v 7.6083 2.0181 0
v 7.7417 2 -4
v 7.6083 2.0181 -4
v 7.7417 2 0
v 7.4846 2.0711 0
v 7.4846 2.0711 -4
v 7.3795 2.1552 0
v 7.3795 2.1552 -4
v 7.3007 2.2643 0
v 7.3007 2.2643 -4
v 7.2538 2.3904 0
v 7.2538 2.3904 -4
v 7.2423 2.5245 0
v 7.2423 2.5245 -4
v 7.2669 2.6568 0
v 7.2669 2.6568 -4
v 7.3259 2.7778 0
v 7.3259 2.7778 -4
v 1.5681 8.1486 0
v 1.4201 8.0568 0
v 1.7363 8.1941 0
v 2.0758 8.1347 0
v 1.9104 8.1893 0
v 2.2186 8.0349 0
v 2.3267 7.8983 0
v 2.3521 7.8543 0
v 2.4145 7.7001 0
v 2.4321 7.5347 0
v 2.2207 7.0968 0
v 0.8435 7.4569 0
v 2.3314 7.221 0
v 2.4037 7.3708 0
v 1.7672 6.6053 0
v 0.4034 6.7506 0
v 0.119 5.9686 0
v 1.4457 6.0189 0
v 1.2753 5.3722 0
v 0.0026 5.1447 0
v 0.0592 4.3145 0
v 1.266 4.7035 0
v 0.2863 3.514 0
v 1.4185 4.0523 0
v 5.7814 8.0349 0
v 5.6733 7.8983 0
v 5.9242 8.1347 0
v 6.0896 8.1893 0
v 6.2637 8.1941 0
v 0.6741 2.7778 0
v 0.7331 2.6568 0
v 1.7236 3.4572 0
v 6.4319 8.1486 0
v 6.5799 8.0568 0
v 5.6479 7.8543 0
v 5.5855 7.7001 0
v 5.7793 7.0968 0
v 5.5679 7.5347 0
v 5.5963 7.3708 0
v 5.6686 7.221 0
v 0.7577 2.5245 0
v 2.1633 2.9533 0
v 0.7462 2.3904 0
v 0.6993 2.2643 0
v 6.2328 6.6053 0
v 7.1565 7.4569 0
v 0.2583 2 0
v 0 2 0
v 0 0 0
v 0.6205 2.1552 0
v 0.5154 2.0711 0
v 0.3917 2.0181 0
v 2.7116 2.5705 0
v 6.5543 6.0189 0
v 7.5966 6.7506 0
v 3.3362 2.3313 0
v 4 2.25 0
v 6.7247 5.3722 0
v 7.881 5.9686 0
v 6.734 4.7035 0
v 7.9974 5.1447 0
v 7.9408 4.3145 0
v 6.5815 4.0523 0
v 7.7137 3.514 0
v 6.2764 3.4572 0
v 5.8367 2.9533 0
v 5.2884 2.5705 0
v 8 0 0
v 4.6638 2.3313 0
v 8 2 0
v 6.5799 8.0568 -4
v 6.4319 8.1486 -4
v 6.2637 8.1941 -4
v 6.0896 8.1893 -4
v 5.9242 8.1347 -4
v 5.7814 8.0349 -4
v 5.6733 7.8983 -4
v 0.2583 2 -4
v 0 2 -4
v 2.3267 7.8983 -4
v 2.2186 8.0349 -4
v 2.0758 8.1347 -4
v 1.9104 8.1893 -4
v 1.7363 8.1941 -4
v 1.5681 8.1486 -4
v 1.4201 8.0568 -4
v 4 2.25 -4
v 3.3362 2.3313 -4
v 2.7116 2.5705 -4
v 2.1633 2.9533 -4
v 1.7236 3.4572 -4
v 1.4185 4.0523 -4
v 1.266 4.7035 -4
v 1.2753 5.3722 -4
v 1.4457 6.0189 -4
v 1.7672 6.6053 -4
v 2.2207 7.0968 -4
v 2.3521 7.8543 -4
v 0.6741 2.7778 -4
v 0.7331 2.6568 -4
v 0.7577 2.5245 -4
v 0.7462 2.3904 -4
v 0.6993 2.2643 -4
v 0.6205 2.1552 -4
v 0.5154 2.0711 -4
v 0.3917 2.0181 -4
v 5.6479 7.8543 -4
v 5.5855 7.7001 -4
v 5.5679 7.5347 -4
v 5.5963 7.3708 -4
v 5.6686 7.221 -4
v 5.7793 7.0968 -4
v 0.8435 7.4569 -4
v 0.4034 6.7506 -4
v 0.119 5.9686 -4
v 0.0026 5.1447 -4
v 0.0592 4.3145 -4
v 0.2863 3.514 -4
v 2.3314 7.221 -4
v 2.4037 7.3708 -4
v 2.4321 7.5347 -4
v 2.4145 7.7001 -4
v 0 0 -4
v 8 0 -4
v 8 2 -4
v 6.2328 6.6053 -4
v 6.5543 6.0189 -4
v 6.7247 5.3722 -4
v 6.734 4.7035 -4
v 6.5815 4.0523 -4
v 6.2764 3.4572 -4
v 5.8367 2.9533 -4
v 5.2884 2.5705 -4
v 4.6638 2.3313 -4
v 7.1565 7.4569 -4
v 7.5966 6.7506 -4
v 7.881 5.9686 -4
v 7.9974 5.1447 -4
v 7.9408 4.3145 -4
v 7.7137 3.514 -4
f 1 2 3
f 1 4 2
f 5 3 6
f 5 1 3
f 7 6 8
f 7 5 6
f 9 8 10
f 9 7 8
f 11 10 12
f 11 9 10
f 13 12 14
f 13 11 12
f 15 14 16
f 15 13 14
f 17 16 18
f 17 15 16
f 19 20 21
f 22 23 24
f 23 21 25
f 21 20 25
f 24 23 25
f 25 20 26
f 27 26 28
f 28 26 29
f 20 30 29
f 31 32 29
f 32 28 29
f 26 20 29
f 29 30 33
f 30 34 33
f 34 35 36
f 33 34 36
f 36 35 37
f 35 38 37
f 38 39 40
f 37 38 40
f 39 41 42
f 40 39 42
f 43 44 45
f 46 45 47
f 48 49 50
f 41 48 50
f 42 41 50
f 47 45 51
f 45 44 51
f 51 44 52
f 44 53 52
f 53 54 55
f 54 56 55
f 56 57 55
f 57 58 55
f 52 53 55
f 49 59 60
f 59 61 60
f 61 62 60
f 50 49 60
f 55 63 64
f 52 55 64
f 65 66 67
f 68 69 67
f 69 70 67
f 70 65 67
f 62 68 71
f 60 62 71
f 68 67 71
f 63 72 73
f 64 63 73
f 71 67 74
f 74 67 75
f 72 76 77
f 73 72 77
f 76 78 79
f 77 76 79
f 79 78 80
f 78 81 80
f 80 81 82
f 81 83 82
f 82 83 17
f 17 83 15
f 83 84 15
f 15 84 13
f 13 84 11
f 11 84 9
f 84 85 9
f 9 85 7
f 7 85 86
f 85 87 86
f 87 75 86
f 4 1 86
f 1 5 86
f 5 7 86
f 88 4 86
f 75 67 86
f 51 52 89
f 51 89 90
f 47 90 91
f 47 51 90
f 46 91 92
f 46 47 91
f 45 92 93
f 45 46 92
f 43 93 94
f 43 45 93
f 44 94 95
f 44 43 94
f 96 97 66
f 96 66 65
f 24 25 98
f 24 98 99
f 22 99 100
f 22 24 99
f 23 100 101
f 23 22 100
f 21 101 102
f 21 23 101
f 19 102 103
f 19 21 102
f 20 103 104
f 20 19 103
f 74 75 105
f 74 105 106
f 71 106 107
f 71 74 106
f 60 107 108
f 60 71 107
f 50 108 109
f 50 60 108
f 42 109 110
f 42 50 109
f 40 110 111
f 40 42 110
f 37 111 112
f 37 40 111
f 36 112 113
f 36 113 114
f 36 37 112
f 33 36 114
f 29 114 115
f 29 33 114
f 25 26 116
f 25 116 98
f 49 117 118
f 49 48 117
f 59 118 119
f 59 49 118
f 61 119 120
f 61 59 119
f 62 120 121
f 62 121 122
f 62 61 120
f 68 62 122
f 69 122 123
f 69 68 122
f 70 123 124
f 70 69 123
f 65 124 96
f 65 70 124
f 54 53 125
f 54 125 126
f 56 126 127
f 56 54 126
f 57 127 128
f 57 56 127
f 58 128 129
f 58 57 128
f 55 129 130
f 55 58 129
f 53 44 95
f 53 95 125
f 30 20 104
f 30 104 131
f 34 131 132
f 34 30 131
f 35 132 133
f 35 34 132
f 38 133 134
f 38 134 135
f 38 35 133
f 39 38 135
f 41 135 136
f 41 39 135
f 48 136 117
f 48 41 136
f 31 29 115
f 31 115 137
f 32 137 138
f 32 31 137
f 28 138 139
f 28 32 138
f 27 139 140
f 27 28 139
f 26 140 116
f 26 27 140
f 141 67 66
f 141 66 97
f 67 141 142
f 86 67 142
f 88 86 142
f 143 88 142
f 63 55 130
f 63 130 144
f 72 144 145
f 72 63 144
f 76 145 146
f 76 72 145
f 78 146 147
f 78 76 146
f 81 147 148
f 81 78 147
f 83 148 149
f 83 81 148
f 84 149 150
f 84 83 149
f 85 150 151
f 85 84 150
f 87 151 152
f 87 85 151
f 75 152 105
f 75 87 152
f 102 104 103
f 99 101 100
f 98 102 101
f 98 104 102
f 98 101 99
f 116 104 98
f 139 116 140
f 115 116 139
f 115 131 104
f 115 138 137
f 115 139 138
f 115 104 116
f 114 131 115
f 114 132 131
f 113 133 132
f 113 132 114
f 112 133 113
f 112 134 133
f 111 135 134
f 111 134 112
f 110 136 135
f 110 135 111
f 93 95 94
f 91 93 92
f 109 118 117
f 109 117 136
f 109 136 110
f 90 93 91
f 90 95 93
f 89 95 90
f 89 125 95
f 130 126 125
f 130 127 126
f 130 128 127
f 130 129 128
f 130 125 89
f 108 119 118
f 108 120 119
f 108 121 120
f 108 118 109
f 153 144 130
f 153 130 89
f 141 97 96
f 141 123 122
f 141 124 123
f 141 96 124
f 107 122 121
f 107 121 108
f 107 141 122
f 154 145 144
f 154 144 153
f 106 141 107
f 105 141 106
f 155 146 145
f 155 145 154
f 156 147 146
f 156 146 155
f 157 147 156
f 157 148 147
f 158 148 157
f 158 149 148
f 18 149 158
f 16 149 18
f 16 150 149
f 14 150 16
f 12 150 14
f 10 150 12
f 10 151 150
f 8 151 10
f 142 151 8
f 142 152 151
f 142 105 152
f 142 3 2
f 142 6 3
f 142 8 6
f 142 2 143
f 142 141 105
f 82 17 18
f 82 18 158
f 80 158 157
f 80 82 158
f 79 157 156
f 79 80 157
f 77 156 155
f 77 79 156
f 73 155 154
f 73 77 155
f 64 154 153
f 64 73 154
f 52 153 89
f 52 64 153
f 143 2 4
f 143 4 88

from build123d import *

# Parameters (mm, degrees)
SKETCH_1_W      = 8
SKETCH_1_H      = 4
EXTRUDE_1_DEPTH = 1
EXTRUDE_2_DEPTH = 4
SKETCH_1_2_W    = 8
SKETCH_1_2_H    = 4
EXTRUDE_3_DEPTH = 2
FILLET_1_R      = 0.5


with BuildPart() as part:
    # 草图1 → 凸台-拉伸1 (new body)
    with BuildSketch(Plane(origin=(0, 0, 0), x_dir=(1, 0, 0), z_dir=(0, 1, 0))):
        with Locations((4, 2)):
            Rectangle(SKETCH_1_W, SKETCH_1_H)
    extrude(amount=EXTRUDE_1_DEPTH)



with BuildPart() as body_2:
    # 草图2 → 凸台-拉伸2 (new body)
    with BuildSketch(Plane.XY):
        with BuildLine():
            ThreePointArc((5.779316158, 7.096791361), (6.581537937, 4.052285972), (4, 2.25))
            Line((4, 2.25), (4, 1))
            ThreePointArc((4, 1), (7.756805699, 3.626533239), (6.579923877, 8.056794529))
            ThreePointArc((6.579923877, 8.056794529), (6.089593434, 8.189308732), (5.673320053, 7.898275349))
            Line((5.673320053, 7.898275349), (5.64791535, 7.854273112))
            ThreePointArc((5.64791535, 7.854273112), (5.57635944, 7.451722303), (5.779316158, 7.096791361))
        make_face()
        with BuildLine():
            ThreePointArc((2.220683842, 7.096791361), (2.42364056, 7.451722303), (2.35208465, 7.854273112))
            Line((2.35208465, 7.854273112), (2.326679947, 7.898275349))
            ThreePointArc((2.326679947, 7.898275349), (1.910406566, 8.189308732), (1.420076123, 8.056794529))
            ThreePointArc((1.420076123, 8.056794529), (0.243194301, 3.626533239), (4, 1))
            Line((4, 1), (4, 2.25))
            ThreePointArc((4, 2.25), (1.418462063, 4.052285972), (2.220683842, 7.096791361))
        make_face()
    extrude(amount=-EXTRUDE_2_DEPTH)


with BuildPart() as part_1:
    add(part.part)

    add(body_2.part)  # 凸台-拉伸3 merges body 2
    # 草图1<2> → 凸台-拉伸3 (add)
    with BuildSketch(Plane(origin=(0, 0, 0), x_dir=(1, 0, 0), z_dir=(0, 1, 0))):
        with Locations((4, 2)):
            Rectangle(SKETCH_1_2_W, SKETCH_1_2_H)
    extrude(amount=EXTRUDE_3_DEPTH)

    # 圆角1
    fillet_1_edges = [part_1.edges().sort_by_distance(p)[0] for p in [
        (1.354248689, 2, -2),
        (6.645751311, 2, -2),
    ]]
    fillet(fillet_1_edges, radius=FILLET_1_R)


solid = part_1.part
